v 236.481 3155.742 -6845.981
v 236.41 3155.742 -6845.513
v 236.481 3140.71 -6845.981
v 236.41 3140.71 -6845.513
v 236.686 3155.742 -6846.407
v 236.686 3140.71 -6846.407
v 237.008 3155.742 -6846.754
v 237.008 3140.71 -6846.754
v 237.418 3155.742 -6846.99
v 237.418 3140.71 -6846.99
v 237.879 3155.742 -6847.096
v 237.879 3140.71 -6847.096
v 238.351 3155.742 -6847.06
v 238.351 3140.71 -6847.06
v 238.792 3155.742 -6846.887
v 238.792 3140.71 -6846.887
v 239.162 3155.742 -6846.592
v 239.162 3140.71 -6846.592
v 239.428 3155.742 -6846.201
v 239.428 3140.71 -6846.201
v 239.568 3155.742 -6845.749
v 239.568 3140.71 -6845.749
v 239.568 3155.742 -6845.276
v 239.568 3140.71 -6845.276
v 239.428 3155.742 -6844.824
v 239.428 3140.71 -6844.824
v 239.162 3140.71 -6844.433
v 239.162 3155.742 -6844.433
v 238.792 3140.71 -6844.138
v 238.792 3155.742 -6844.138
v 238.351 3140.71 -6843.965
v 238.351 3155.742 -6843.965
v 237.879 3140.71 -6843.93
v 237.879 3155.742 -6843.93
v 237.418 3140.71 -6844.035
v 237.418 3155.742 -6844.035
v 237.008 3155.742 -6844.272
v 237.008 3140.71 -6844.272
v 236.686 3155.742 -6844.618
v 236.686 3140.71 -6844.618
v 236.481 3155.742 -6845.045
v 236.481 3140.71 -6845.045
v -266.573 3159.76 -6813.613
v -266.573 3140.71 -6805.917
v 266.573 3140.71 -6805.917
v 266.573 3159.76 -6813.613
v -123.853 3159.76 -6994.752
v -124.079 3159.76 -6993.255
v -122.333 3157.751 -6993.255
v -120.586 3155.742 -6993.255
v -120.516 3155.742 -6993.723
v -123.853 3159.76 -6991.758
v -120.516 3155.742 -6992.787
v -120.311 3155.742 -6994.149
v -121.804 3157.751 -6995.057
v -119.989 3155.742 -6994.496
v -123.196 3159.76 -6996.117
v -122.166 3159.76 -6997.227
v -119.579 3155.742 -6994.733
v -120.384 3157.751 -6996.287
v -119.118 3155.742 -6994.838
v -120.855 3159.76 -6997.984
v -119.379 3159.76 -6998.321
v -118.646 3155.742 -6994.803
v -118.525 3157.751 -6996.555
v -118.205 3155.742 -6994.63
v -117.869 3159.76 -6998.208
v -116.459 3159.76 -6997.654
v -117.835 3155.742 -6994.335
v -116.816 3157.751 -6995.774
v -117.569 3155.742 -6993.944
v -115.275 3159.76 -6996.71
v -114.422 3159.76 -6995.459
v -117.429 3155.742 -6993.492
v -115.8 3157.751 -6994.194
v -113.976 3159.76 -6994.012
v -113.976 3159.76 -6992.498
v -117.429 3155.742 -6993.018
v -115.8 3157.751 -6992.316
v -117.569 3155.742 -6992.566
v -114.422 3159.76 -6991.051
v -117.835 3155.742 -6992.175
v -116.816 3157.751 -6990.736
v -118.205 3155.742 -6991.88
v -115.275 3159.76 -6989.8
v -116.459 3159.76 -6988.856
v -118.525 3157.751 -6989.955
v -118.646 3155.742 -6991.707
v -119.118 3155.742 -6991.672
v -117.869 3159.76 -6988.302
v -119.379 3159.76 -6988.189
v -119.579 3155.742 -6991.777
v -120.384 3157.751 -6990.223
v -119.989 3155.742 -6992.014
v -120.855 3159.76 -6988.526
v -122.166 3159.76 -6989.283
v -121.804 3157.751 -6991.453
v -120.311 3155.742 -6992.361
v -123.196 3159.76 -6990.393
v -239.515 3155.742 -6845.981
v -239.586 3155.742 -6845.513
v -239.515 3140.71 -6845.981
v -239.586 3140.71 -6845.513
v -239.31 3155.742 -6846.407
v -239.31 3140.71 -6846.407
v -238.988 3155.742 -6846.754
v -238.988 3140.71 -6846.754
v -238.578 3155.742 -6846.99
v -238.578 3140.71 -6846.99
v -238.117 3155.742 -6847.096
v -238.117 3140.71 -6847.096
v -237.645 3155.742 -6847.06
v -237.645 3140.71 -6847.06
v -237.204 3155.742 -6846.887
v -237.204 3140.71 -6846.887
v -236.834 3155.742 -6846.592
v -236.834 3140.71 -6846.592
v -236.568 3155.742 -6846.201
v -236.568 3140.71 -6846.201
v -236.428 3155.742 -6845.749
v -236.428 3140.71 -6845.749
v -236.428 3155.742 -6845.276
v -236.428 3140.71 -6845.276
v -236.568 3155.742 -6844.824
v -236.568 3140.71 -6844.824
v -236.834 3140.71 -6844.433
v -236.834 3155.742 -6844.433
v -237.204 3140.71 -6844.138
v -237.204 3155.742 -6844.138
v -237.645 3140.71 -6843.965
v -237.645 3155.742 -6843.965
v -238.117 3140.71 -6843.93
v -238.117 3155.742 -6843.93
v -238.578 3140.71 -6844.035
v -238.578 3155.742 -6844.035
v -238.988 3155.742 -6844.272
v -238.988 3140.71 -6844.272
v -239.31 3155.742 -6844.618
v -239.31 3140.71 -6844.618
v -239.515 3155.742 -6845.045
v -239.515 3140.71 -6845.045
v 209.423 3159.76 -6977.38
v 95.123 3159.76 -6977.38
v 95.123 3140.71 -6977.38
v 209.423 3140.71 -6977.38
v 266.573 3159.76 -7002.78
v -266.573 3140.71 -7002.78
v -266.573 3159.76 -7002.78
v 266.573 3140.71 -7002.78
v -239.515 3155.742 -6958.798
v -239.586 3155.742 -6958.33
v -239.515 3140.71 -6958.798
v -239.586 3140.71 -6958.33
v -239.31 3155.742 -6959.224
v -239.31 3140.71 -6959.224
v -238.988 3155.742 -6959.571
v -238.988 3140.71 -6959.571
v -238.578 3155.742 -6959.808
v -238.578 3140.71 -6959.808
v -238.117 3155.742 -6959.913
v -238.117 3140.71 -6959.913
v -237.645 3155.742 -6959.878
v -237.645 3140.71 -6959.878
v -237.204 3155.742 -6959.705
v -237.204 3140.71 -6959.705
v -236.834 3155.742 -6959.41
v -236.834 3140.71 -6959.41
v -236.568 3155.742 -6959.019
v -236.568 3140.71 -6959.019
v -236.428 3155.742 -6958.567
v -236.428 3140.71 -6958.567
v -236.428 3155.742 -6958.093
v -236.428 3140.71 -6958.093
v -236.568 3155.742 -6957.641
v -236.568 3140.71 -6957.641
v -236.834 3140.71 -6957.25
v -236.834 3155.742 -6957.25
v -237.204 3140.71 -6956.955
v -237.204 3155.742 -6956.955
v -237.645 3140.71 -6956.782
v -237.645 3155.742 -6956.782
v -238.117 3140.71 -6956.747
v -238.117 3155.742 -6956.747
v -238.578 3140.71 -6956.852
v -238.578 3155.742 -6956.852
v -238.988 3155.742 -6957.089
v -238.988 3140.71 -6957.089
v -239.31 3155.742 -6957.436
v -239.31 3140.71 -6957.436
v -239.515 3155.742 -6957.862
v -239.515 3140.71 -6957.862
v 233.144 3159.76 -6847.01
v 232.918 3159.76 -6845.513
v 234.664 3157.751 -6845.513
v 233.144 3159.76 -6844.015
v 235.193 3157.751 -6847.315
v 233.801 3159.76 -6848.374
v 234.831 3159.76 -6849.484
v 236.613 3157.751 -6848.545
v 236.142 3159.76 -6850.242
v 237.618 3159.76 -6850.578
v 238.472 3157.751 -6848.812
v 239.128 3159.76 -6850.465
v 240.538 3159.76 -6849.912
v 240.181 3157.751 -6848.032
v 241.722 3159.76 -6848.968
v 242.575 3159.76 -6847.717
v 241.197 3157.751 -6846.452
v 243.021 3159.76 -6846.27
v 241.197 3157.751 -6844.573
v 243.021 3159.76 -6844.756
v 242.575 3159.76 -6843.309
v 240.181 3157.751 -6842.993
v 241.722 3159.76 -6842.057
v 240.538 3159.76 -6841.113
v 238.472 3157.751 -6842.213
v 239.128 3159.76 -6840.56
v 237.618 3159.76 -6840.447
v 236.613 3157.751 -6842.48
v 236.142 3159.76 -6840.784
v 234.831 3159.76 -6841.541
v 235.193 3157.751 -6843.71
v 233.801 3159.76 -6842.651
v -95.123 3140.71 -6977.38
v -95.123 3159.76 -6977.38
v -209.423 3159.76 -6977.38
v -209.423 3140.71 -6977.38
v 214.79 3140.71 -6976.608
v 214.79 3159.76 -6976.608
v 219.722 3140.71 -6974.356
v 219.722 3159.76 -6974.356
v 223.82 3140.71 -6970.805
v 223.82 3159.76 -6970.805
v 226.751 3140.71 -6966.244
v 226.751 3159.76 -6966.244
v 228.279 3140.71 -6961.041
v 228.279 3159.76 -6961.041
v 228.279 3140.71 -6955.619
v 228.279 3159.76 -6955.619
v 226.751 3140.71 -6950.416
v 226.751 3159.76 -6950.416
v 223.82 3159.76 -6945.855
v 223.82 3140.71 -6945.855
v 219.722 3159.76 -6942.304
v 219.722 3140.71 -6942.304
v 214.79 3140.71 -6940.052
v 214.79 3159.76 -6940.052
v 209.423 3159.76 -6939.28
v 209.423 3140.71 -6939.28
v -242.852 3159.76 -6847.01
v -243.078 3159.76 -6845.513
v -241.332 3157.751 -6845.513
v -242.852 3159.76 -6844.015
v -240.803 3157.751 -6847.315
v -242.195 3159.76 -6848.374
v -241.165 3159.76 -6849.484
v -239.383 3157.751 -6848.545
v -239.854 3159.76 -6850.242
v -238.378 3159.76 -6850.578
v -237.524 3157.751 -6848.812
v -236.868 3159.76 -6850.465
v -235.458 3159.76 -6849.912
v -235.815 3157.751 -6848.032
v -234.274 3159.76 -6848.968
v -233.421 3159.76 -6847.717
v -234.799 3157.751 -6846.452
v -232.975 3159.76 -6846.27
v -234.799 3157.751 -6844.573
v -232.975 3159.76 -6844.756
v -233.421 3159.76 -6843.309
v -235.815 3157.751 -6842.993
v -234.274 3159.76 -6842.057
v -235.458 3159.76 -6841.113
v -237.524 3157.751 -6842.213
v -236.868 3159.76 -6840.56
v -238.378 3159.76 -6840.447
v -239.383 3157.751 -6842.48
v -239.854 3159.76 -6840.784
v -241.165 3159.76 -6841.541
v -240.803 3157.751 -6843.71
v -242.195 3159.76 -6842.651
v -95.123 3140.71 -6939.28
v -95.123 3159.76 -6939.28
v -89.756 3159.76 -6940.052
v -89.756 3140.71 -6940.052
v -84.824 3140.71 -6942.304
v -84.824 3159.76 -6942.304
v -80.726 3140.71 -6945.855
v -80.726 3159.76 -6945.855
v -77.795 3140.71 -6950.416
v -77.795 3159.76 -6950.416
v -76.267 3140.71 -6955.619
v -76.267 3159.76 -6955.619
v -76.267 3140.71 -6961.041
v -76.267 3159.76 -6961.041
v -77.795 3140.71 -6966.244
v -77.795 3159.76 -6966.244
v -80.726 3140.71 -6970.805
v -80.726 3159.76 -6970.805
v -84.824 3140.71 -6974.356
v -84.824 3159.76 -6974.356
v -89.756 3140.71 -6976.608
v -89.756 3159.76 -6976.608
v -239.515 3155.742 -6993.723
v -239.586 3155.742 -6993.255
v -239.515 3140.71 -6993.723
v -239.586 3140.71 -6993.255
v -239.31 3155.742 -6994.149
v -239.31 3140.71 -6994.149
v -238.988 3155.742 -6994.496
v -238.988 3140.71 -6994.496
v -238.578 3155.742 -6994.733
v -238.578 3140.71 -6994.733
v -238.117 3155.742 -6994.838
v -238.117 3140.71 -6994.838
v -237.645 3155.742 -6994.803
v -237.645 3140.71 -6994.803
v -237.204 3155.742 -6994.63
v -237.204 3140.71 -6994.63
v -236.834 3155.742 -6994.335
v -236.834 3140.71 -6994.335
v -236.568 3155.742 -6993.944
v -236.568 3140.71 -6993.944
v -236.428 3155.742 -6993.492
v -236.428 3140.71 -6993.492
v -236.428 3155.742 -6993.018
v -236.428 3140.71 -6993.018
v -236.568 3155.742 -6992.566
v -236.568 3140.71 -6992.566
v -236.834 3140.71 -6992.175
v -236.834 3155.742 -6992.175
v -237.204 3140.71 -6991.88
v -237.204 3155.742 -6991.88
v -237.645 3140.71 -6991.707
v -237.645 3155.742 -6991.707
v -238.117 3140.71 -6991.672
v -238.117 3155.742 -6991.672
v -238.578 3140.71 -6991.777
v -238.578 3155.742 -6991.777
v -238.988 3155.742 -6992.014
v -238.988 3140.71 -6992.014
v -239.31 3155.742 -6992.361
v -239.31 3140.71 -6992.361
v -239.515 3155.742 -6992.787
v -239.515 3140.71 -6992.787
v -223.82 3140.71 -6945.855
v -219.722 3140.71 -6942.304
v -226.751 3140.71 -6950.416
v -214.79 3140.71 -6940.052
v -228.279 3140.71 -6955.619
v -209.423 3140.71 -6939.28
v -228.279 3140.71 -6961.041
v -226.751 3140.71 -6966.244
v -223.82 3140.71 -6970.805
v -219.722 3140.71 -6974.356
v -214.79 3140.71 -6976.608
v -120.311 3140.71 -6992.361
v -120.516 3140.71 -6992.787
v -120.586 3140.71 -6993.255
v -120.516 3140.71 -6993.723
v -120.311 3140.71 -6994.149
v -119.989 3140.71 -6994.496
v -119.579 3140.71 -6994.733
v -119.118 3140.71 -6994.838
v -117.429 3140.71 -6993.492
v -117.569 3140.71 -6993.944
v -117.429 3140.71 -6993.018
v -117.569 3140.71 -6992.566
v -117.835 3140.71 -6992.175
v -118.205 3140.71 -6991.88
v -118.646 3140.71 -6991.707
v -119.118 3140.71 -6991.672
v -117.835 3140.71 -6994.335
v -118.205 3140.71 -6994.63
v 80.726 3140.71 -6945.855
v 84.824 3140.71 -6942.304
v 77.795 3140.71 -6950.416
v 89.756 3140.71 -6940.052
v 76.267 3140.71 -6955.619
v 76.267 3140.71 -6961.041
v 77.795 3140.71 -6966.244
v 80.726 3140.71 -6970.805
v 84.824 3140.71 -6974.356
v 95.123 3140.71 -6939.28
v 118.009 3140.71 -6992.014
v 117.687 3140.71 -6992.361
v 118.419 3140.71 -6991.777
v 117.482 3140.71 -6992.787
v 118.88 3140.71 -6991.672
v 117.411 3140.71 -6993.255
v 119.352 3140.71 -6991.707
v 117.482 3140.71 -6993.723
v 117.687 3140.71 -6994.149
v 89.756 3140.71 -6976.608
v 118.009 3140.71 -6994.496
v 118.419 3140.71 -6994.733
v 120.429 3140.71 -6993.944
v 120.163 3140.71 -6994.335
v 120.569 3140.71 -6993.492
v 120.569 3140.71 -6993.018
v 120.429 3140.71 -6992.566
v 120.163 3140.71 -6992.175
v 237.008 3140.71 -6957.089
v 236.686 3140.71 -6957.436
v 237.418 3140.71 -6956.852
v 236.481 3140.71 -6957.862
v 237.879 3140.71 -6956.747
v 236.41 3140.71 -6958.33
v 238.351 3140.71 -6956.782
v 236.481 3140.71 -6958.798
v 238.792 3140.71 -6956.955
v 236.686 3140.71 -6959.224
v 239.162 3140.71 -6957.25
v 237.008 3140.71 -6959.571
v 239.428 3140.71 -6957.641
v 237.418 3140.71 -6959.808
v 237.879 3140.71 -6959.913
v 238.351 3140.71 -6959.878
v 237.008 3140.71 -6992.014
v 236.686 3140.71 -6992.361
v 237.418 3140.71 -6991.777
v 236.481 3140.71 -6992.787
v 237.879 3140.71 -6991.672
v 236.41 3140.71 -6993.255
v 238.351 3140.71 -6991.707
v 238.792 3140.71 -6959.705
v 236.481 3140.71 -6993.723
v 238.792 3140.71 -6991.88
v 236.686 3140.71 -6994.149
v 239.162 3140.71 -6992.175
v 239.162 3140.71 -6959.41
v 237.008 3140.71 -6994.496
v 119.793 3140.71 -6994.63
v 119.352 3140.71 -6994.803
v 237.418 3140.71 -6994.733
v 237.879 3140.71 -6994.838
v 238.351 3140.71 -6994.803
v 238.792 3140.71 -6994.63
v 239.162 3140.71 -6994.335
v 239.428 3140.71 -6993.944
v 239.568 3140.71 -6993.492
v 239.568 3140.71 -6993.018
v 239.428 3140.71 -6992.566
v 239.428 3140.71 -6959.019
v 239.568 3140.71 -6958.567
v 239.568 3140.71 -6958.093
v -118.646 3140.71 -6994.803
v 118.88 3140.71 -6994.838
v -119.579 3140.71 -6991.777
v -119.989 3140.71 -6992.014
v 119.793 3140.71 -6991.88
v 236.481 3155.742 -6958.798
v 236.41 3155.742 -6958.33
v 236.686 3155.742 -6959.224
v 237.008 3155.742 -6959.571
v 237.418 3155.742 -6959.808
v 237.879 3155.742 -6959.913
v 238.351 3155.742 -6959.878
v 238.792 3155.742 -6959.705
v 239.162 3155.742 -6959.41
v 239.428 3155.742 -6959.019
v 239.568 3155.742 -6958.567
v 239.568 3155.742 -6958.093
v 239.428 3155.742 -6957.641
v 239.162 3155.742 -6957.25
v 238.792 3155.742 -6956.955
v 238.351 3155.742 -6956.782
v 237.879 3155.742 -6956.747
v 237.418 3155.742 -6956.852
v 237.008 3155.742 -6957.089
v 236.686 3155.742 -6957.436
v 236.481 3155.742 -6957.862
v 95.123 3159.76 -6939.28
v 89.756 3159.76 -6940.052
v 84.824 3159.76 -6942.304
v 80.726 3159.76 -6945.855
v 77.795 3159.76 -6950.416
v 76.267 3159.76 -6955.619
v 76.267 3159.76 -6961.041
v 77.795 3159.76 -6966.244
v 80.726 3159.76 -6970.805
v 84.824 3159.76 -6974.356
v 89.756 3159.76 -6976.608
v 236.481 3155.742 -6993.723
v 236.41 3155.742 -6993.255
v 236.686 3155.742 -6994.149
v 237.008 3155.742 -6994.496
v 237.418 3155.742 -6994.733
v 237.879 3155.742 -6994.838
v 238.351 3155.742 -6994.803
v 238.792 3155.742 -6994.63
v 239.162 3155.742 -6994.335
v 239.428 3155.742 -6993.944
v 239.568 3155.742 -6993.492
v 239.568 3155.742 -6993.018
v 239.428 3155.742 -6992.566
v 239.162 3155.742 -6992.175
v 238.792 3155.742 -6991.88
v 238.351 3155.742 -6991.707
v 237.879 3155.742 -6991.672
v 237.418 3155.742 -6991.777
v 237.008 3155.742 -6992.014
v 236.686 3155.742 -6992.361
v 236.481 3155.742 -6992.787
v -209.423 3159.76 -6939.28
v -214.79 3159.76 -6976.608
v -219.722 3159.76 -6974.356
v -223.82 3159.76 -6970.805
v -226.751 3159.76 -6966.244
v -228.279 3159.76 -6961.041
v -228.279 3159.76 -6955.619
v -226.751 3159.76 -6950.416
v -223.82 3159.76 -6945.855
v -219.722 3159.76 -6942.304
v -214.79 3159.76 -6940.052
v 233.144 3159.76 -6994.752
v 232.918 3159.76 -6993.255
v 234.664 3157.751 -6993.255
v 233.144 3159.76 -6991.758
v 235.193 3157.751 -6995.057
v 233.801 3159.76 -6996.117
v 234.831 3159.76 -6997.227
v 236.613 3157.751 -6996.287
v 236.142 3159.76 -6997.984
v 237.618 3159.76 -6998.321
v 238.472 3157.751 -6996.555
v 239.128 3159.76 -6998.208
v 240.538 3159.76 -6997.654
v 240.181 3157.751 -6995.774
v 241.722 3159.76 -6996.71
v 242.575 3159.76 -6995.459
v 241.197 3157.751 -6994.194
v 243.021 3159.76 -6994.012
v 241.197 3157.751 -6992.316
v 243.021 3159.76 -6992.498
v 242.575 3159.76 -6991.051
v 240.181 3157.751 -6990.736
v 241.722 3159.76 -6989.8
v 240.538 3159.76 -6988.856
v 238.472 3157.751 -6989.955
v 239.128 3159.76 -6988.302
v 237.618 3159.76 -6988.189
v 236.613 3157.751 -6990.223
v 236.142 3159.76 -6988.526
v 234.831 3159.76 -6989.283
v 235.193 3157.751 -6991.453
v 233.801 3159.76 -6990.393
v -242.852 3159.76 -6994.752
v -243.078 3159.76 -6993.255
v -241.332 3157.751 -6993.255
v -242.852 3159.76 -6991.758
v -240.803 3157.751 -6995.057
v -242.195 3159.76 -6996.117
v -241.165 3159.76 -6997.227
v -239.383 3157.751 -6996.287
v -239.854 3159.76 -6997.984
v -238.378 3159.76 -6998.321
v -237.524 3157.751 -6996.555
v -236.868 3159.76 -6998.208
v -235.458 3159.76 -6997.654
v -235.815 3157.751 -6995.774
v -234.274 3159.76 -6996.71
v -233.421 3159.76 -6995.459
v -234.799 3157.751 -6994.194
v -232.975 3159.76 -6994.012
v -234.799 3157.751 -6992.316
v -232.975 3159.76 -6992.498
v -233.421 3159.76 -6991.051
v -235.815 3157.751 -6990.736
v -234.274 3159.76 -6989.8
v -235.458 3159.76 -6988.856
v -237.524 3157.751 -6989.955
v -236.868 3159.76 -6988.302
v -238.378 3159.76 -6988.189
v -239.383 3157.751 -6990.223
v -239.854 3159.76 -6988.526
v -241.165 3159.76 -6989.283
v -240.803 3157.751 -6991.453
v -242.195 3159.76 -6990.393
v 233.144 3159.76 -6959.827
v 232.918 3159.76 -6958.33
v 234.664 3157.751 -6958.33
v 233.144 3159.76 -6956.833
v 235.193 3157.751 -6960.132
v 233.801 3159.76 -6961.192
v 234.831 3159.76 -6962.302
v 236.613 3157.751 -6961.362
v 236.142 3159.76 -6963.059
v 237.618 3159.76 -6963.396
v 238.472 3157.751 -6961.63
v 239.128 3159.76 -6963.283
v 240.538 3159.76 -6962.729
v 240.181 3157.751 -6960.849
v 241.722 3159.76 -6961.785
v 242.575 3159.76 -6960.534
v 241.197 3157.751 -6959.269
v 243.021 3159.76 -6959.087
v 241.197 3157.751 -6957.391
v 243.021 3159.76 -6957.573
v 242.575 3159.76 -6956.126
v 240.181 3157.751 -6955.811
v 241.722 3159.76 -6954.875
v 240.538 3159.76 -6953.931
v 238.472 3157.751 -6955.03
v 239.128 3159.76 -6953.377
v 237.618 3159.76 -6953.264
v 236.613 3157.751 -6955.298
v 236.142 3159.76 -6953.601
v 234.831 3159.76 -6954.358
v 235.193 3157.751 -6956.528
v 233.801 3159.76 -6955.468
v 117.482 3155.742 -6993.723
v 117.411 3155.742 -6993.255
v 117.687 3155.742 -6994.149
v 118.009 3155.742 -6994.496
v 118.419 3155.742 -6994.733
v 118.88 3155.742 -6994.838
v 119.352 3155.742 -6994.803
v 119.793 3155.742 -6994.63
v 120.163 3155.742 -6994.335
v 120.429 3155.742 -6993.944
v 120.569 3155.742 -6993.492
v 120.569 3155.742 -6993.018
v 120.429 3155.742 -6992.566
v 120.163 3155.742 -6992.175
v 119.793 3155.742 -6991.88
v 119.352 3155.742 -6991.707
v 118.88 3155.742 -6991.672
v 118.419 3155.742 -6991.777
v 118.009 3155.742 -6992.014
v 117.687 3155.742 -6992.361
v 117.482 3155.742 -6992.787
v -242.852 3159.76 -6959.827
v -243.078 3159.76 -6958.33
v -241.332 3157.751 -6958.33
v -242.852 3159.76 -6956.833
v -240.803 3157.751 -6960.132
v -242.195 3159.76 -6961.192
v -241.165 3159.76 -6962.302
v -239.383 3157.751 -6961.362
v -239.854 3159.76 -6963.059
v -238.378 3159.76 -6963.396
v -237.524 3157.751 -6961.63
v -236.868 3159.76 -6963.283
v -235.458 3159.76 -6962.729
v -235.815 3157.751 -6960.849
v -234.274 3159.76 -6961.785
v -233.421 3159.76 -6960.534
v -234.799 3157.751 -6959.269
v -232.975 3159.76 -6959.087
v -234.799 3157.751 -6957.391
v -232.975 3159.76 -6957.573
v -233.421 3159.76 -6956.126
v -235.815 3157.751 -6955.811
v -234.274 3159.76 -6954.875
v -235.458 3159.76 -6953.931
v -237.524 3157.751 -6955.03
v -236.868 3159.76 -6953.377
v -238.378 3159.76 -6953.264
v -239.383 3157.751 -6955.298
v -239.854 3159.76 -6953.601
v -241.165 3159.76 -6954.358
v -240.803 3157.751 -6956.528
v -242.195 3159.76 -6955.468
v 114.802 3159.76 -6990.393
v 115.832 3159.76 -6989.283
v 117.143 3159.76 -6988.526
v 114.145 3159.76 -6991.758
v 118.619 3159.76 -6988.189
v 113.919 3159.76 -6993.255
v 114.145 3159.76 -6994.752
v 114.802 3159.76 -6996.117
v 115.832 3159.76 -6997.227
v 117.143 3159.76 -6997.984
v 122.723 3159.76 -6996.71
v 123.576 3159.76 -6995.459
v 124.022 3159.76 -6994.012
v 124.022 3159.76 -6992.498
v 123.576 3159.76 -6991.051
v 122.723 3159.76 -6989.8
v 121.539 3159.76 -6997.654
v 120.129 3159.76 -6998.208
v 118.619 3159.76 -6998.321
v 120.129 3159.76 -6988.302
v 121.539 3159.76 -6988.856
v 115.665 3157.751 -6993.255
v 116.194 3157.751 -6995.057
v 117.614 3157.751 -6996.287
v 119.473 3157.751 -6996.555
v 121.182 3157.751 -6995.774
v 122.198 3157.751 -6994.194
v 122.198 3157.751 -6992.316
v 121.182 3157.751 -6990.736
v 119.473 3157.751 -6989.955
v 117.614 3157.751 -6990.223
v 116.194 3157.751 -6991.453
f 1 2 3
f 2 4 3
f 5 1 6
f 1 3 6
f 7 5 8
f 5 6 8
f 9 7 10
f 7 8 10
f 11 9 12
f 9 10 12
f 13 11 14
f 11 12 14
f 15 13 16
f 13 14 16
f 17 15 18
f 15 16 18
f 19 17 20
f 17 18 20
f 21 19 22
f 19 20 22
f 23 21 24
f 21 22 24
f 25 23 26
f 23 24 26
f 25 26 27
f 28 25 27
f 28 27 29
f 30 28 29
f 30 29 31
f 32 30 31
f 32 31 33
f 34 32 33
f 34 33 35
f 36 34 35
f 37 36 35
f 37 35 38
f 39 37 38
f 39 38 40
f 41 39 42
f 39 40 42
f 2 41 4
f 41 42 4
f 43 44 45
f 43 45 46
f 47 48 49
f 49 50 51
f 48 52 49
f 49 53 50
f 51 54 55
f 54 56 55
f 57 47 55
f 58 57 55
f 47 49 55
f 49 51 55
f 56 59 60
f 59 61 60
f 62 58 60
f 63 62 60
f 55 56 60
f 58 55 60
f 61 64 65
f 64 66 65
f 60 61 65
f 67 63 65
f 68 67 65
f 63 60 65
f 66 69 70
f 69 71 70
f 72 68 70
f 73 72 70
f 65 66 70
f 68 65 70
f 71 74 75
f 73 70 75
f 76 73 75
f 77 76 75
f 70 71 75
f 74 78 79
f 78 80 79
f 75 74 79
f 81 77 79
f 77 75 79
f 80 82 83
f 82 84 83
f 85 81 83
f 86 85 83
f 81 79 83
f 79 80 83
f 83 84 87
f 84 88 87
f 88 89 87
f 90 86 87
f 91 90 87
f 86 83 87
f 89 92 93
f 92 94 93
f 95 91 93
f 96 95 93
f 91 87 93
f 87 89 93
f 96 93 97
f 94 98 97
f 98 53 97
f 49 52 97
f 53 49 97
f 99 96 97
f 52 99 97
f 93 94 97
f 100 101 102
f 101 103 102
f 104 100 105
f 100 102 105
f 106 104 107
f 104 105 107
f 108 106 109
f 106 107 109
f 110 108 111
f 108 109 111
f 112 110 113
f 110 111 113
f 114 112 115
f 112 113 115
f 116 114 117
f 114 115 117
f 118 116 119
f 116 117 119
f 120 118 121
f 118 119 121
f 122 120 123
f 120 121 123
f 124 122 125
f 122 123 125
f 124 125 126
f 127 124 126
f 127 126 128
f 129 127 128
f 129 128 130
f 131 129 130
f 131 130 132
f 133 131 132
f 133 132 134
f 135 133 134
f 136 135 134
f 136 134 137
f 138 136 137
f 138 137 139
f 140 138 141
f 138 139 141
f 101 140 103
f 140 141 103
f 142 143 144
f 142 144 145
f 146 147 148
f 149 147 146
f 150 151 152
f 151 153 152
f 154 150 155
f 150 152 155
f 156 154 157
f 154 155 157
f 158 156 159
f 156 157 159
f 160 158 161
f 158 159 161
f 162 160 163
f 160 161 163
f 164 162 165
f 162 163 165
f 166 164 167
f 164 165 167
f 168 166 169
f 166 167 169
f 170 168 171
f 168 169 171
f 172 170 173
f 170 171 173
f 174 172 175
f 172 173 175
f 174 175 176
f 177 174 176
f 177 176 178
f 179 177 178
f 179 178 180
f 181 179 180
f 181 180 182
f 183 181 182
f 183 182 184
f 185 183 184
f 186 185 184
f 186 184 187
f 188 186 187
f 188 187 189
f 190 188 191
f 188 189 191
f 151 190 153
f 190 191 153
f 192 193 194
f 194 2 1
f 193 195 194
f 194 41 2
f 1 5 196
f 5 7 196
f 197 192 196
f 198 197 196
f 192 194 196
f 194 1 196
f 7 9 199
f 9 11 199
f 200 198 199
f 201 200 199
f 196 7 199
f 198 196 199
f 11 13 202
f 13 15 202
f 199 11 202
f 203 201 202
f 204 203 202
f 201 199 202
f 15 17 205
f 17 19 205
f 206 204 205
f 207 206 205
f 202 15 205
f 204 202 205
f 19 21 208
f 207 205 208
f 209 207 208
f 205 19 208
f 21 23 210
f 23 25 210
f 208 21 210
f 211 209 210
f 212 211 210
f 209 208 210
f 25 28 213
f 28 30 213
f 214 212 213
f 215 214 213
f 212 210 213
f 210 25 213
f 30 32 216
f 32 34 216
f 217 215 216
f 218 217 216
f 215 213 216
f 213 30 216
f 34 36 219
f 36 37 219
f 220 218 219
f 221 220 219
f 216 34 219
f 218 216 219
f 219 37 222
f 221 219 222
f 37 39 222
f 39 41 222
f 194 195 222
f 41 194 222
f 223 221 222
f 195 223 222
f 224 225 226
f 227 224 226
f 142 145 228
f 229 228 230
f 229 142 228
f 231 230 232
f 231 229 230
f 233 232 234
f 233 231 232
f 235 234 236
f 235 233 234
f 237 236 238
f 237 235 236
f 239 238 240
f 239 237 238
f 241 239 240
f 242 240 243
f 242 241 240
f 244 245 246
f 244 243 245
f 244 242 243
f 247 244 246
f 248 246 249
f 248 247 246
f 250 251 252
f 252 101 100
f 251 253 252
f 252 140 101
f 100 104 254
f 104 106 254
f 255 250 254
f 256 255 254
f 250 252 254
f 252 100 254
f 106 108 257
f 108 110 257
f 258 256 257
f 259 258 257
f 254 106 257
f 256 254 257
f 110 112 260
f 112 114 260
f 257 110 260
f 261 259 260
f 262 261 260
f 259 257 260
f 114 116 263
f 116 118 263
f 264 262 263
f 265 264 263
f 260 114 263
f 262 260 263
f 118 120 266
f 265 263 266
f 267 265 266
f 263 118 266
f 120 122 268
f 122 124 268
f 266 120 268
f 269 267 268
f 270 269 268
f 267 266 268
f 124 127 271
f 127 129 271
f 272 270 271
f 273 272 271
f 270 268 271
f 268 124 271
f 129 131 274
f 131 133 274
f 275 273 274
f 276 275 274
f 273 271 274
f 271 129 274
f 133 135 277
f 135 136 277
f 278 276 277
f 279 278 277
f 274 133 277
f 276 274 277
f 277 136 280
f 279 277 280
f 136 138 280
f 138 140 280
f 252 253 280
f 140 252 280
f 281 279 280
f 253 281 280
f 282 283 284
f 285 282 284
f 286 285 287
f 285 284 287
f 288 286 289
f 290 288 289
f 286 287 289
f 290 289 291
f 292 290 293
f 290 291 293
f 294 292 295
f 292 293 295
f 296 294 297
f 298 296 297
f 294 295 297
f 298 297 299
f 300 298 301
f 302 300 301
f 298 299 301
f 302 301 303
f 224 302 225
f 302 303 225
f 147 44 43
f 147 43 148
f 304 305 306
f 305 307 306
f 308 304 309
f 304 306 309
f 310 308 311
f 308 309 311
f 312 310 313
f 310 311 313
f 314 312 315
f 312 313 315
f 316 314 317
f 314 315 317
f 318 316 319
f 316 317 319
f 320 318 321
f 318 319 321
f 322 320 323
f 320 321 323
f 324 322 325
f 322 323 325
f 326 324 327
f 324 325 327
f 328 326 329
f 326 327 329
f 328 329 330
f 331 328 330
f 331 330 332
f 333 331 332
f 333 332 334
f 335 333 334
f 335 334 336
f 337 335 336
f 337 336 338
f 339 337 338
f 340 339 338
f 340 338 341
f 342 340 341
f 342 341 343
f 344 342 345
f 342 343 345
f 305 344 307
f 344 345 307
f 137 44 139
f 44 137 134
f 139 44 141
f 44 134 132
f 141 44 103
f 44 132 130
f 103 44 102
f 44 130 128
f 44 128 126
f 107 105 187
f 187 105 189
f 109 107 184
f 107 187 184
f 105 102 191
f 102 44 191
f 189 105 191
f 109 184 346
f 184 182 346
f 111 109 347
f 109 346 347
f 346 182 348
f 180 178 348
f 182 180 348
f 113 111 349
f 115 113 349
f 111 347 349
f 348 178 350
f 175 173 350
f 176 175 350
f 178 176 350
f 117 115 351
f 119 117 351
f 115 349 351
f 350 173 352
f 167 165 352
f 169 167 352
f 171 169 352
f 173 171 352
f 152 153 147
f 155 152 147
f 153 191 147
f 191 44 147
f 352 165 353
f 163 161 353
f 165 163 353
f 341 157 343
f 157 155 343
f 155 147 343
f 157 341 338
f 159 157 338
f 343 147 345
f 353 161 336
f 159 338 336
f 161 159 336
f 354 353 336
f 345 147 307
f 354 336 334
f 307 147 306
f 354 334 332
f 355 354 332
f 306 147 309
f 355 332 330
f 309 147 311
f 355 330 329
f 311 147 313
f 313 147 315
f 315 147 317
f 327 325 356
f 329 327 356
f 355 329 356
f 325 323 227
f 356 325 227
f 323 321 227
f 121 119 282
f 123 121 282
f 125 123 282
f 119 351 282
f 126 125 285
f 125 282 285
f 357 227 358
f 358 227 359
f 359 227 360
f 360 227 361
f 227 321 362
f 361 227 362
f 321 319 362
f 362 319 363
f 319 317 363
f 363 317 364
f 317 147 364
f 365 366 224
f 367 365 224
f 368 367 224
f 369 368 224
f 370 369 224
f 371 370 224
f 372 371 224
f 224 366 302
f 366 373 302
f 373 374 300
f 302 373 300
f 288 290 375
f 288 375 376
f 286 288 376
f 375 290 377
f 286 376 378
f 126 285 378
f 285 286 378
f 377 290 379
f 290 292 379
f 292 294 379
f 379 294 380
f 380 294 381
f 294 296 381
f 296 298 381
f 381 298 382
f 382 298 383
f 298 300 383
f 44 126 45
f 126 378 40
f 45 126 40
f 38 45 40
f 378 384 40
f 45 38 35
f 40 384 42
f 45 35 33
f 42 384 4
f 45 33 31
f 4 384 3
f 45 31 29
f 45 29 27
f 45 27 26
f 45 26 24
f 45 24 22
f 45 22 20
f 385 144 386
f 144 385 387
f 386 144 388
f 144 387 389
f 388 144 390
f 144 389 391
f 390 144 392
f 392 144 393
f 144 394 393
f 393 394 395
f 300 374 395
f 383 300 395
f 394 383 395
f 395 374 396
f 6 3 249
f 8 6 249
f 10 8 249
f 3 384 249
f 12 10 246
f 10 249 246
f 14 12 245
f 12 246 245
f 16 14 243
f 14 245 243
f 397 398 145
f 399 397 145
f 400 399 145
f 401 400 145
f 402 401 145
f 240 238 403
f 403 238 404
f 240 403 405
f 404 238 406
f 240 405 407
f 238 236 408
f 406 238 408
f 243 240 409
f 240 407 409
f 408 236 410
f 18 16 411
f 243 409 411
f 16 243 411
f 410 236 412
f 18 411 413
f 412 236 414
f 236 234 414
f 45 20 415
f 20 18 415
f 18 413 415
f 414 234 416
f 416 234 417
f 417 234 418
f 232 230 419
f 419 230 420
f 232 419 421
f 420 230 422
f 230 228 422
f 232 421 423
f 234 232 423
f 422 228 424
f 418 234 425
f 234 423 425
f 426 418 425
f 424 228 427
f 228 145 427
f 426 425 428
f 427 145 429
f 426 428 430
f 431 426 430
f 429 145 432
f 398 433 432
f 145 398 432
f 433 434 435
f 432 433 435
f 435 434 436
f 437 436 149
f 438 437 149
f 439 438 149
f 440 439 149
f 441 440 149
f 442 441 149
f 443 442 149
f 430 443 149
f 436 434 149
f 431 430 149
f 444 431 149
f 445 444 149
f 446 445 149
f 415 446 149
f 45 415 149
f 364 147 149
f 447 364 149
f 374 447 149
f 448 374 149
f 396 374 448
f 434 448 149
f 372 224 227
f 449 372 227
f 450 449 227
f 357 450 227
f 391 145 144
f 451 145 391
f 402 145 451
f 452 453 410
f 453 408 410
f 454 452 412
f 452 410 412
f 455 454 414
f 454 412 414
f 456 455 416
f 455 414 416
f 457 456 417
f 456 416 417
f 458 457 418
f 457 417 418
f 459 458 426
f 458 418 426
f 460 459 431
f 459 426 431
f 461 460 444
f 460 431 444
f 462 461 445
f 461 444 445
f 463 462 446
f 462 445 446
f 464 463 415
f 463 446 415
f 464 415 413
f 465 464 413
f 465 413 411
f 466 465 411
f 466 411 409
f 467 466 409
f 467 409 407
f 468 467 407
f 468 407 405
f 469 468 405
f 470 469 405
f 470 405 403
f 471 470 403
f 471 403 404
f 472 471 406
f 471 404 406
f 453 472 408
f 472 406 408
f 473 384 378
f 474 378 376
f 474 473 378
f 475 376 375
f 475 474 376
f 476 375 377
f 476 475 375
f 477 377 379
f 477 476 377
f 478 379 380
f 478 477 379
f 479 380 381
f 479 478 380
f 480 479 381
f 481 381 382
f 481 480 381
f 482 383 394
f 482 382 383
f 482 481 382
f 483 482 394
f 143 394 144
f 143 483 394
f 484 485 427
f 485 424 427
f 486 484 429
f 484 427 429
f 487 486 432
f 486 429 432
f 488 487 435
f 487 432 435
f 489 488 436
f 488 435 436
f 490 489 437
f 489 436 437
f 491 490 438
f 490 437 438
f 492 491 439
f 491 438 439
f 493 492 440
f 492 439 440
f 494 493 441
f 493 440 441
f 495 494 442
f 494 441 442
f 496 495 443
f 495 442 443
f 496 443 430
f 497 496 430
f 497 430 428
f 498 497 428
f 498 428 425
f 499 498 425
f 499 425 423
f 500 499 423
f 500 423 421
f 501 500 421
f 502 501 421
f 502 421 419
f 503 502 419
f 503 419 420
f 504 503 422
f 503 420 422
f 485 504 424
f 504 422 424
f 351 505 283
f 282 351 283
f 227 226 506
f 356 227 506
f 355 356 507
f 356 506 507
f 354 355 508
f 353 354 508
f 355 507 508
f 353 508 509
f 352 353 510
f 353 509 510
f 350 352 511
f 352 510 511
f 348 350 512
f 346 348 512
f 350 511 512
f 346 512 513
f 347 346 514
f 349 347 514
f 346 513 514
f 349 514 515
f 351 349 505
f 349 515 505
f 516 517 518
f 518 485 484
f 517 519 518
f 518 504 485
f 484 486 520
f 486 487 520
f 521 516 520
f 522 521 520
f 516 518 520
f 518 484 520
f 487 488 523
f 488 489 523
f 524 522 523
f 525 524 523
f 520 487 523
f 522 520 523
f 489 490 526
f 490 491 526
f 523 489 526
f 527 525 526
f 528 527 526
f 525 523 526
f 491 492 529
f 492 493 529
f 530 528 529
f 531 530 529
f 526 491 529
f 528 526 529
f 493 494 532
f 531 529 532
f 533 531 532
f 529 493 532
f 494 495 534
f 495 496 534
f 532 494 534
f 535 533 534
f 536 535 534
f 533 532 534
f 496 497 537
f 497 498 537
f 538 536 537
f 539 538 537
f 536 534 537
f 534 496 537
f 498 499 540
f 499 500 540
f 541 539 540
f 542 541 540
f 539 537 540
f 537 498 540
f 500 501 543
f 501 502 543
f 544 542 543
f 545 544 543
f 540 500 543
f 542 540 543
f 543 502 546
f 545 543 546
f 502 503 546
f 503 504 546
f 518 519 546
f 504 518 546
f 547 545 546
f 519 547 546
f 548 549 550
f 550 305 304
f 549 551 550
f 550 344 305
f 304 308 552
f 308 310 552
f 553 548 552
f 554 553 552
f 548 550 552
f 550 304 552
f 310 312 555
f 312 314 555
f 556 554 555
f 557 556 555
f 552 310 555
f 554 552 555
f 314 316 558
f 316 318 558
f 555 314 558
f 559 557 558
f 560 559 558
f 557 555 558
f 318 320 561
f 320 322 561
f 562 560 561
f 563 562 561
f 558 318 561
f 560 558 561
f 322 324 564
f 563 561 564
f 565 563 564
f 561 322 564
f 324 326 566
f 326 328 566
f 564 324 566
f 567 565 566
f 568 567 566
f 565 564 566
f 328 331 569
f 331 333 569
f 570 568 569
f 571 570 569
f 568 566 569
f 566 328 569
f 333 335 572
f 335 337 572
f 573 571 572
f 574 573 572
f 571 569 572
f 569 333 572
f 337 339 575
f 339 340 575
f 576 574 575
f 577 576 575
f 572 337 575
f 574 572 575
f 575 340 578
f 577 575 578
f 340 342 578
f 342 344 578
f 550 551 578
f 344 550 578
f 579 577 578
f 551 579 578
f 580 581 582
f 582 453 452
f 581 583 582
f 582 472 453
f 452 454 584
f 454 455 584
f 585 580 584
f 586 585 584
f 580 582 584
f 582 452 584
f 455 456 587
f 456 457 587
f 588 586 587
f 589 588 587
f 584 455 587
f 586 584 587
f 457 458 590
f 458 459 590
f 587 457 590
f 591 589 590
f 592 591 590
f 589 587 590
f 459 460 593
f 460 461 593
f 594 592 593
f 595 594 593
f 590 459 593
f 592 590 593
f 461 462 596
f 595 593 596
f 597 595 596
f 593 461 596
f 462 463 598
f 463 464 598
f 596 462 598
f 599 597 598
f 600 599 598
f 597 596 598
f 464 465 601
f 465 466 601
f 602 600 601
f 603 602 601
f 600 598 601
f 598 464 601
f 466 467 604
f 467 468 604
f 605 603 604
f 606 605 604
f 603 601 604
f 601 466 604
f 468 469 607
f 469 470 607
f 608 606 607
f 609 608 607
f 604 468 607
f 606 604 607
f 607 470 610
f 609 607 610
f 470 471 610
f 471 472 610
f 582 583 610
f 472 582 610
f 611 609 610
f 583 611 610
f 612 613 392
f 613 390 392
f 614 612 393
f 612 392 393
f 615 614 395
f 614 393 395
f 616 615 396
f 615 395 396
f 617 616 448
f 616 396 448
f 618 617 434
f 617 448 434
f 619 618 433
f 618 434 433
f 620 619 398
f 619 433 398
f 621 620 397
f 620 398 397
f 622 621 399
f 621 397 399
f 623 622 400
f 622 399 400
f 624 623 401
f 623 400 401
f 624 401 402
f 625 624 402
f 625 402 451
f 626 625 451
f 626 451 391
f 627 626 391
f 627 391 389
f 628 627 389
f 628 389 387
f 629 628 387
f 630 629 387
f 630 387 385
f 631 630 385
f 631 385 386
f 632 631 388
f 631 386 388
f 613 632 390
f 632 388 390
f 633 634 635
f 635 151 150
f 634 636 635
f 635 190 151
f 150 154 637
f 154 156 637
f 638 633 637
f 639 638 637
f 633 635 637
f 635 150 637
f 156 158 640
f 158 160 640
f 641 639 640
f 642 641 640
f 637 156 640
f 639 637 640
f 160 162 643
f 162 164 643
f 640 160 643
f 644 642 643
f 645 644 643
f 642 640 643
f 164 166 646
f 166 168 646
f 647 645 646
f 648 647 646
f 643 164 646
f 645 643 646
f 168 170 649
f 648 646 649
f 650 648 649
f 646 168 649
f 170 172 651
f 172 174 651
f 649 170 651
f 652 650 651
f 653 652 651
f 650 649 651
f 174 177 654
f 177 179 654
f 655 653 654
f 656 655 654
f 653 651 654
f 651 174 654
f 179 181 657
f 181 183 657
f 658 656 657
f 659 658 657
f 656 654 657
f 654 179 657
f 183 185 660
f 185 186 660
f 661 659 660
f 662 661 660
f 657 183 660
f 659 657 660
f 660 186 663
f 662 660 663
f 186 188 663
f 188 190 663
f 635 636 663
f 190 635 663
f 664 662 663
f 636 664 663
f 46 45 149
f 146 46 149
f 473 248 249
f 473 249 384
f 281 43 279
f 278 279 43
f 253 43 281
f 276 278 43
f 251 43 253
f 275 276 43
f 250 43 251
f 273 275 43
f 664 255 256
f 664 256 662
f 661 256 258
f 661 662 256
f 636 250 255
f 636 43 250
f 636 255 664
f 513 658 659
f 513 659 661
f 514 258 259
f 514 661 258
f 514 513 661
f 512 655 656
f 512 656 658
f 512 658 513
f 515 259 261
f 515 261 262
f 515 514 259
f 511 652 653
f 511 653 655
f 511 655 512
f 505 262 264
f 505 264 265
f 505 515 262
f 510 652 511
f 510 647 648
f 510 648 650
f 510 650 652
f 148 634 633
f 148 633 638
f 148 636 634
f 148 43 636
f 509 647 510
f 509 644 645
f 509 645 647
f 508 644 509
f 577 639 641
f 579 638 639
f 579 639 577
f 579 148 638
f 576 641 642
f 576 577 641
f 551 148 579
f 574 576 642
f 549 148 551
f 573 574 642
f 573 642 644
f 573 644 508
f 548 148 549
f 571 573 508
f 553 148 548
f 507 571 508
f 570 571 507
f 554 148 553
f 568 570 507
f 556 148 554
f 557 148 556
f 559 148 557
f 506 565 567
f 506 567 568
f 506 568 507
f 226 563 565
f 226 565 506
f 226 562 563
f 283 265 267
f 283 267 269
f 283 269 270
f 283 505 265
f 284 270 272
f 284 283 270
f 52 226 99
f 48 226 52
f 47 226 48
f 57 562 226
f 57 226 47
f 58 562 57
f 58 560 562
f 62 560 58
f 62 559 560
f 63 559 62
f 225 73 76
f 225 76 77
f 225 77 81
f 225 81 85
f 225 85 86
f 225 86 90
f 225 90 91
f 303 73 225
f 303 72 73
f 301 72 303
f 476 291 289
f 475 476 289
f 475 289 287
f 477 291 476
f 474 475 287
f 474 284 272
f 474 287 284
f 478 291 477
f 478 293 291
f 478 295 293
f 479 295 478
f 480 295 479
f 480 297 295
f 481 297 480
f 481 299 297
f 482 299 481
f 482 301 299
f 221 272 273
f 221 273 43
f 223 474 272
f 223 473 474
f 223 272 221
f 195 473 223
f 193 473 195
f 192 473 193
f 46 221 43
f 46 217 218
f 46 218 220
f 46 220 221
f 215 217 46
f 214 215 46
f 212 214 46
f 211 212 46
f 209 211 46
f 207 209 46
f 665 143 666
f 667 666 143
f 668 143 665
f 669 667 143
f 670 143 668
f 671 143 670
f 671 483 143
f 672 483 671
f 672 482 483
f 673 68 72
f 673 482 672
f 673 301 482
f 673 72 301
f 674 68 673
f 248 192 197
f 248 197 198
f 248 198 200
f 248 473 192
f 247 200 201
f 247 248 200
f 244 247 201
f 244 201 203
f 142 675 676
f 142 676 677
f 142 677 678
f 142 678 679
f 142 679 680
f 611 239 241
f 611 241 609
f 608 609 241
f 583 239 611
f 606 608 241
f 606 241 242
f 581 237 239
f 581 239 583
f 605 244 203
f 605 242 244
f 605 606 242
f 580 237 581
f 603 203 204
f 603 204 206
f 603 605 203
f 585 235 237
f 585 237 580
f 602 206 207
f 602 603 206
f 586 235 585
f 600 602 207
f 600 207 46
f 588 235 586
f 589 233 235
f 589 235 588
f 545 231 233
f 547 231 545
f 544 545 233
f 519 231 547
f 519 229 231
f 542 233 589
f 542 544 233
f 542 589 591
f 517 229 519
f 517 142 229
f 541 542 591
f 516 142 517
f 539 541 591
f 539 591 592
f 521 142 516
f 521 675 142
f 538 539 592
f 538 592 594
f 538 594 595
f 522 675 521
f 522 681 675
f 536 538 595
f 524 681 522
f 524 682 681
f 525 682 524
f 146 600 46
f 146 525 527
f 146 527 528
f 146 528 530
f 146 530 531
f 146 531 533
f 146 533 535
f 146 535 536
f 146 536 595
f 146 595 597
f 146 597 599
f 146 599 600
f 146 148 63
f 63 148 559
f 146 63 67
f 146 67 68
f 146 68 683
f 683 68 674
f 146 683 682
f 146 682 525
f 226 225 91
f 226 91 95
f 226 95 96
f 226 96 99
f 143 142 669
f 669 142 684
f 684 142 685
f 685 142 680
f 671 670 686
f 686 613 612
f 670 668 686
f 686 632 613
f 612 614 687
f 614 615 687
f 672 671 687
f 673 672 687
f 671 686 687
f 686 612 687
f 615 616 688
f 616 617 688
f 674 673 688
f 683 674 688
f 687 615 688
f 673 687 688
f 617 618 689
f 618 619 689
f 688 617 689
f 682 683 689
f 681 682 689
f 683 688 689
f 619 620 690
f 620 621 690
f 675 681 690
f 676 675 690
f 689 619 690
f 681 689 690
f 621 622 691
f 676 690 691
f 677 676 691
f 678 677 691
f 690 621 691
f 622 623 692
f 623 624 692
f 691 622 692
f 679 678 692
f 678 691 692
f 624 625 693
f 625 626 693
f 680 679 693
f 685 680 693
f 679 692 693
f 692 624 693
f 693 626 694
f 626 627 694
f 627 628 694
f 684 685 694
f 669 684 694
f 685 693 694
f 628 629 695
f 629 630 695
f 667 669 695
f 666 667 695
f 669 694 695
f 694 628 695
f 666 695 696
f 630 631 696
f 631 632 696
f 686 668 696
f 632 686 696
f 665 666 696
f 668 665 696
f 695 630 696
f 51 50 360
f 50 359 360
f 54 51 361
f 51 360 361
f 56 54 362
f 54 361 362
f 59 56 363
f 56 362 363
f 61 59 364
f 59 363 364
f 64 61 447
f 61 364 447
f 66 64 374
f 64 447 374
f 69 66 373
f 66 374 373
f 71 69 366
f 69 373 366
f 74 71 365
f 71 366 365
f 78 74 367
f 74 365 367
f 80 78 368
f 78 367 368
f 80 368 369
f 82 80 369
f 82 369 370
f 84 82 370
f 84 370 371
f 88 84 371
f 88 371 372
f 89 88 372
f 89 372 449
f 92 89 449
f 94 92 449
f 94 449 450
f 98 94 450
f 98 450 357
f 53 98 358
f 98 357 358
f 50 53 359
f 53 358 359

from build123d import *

# Parameters (mm, degrees)
SKETCH1_W           = 533.146
SKETCH1_H           = 196.863399688
BOSS_EXTRUDE1_DEPTH = 19.05
CUT_EXTRUDE1_DEPTH  = 7702.120410186
CUT_EXTRUDE2_DEPTH  = 7008.877833132
HOLE1_D             = 3.175
HOLE1_DEPTH         = 38.1
HOLE1_CSINK_D       = 10.16
HOLE1_CSINK_ANGLE   = 82
HOLE1_TIP           = 0.953866233


with BuildPart() as part:
    # Sketch1 → Boss-Extrude1 (new body)
    with BuildSketch(Plane(origin=(0, 3140.71, 0), x_dir=(1, 0, 0), z_dir=(0, 1, 0))):
        with Locations((0, 6904.348295077)):
            Rectangle(SKETCH1_W, SKETCH1_H)
    extrude(amount=BOSS_EXTRUDE1_DEPTH)

    # Sketch2 → Cut-Extrude1 (cut, through all)
    with BuildSketch(Plane(origin=(266.573, 0, 0), x_dir=(0, 0, -1), z_dir=(1, 0, 0))):
        Polygon((6805.916595233, 3140.710000001), (6813.613294835, 3159.760000001), (6805.916595233, 3159.760000001), align=None)
    extrude(amount=-CUT_EXTRUDE1_DEPTH, mode=Mode.SUBTRACT)

    # Sketch3 → Cut-Extrude2 (cut, through all)
    with BuildSketch(Plane(origin=(0, 3159.76, 0), x_dir=(1, 0, 0), z_dir=(0, 1, 0))):
        with BuildLine():
            Line((209.423, 6939.279994921), (95.123, 6939.279994921))
            ThreePointArc((95.123, 6939.279994921), (76.073, 6958.329994921), (95.123, 6977.379994921))
            Line((95.123, 6977.379994921), (209.423, 6977.379994921))
            ThreePointArc((209.423, 6977.379994921), (228.473, 6958.329994921), (209.423, 6939.279994921))
        make_face()
        with BuildLine():
            Line((-209.423, 6939.279994921), (-95.123, 6939.279994921))
            ThreePointArc((-95.123, 6939.279994921), (-76.073, 6958.329994921), (-95.123, 6977.379994921))
            Line((-95.123, 6977.379994921), (-209.423, 6977.379994921))
            ThreePointArc((-209.423, 6977.379994921), (-228.473, 6958.329994921), (-209.423, 6939.279994921))
        make_face()
    extrude(amount=-CUT_EXTRUDE2_DEPTH, mode=Mode.SUBTRACT)

    # Hole1
    with Locations(Plane(origin=(0, 3159.76, 0), x_dir=(1, 0, 0), z_dir=(0, 1, 0))):
        with Locations((-118.999, 6993.254994921), (237.998, 6993.254994921), (237.998, 6958.329994921), (237.998, 6845.512682081), (-237.998, 6993.254994921), (-237.998, 6958.329994921), (-237.998, 6845.512682081), (118.999, 6993.254994921)):
            CounterSinkHole(HOLE1_D / 2, HOLE1_CSINK_D / 2, depth=HOLE1_DEPTH, counter_sink_angle=HOLE1_CSINK_ANGLE)
            with Locations((0, 0, -(HOLE1_DEPTH + HOLE1_TIP / 2))):  # 118° drill point
                Cone(0, HOLE1_D / 2, HOLE1_TIP, mode=Mode.SUBTRACT)


solid = part.part
